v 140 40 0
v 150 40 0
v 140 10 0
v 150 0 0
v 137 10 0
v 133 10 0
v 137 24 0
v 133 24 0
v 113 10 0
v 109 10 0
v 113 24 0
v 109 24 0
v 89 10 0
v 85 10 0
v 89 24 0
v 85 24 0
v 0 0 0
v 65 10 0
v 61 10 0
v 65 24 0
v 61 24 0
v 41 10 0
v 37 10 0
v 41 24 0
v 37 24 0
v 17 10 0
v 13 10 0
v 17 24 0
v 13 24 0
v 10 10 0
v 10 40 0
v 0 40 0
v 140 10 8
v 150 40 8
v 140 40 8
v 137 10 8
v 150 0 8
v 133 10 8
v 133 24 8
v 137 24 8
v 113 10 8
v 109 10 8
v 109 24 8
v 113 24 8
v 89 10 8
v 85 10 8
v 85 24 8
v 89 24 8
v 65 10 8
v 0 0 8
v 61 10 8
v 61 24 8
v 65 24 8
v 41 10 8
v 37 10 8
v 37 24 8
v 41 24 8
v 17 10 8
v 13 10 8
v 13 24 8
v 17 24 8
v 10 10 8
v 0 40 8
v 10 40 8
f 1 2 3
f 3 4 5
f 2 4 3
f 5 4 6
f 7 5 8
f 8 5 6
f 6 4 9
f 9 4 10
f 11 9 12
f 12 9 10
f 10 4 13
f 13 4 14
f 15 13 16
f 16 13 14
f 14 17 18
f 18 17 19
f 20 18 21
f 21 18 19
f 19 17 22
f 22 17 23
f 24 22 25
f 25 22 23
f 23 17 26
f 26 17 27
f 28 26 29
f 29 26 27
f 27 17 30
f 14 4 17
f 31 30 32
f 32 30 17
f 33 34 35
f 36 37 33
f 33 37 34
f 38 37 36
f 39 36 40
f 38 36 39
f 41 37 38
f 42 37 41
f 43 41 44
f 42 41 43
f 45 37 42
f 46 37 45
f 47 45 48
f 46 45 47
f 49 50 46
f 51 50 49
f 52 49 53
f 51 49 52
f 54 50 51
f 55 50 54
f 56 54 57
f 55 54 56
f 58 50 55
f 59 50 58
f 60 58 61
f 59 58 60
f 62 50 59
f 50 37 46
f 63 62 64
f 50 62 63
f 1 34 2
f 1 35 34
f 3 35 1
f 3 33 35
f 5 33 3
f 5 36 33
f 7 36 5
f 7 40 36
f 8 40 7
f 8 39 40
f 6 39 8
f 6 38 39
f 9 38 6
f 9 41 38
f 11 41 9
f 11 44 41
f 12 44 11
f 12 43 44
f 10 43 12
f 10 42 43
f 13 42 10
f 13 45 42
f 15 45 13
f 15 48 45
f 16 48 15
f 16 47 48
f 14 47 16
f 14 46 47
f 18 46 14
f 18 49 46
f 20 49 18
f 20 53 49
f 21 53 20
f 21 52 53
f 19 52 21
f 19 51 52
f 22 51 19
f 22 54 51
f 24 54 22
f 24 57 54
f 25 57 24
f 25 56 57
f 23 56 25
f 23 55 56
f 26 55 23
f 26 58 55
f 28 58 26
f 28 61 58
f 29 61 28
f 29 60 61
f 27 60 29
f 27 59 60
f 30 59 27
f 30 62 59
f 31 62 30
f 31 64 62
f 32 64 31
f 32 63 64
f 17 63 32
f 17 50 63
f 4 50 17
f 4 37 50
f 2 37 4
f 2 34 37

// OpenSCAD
$fn = 32;

// ----------------------------------------------------------------------
// Guard grille: 6 slats over a 150 x 40 mm plate
// ----------------------------------------------------------------------

// --- parameters (mm) ---
profile_height = 8;       // extrusion height
profile_points = 32;      // points of the closed outline

profile = [[0, 0], [150, 0], [150, 40], [140, 40], [140, 10], [137, 10], [137, 24], [133, 24], [133, 10], [113, 10], [113, 24], [109, 24], [109, 10], [89, 10], [89, 24], [85, 24], [85, 10], [65, 10], [65, 24], [61, 24], [61, 10], [41, 10], [41, 24], [37, 24], [37, 10], [17, 10], [17, 24], [13, 24], [13, 10], [10, 10], [10, 40], [0, 40]];  // single closed polygon, 32 points, counter clockwise

// --- the one profile operation ---
linear_extrude(height = profile_height) polygon(points = profile);
